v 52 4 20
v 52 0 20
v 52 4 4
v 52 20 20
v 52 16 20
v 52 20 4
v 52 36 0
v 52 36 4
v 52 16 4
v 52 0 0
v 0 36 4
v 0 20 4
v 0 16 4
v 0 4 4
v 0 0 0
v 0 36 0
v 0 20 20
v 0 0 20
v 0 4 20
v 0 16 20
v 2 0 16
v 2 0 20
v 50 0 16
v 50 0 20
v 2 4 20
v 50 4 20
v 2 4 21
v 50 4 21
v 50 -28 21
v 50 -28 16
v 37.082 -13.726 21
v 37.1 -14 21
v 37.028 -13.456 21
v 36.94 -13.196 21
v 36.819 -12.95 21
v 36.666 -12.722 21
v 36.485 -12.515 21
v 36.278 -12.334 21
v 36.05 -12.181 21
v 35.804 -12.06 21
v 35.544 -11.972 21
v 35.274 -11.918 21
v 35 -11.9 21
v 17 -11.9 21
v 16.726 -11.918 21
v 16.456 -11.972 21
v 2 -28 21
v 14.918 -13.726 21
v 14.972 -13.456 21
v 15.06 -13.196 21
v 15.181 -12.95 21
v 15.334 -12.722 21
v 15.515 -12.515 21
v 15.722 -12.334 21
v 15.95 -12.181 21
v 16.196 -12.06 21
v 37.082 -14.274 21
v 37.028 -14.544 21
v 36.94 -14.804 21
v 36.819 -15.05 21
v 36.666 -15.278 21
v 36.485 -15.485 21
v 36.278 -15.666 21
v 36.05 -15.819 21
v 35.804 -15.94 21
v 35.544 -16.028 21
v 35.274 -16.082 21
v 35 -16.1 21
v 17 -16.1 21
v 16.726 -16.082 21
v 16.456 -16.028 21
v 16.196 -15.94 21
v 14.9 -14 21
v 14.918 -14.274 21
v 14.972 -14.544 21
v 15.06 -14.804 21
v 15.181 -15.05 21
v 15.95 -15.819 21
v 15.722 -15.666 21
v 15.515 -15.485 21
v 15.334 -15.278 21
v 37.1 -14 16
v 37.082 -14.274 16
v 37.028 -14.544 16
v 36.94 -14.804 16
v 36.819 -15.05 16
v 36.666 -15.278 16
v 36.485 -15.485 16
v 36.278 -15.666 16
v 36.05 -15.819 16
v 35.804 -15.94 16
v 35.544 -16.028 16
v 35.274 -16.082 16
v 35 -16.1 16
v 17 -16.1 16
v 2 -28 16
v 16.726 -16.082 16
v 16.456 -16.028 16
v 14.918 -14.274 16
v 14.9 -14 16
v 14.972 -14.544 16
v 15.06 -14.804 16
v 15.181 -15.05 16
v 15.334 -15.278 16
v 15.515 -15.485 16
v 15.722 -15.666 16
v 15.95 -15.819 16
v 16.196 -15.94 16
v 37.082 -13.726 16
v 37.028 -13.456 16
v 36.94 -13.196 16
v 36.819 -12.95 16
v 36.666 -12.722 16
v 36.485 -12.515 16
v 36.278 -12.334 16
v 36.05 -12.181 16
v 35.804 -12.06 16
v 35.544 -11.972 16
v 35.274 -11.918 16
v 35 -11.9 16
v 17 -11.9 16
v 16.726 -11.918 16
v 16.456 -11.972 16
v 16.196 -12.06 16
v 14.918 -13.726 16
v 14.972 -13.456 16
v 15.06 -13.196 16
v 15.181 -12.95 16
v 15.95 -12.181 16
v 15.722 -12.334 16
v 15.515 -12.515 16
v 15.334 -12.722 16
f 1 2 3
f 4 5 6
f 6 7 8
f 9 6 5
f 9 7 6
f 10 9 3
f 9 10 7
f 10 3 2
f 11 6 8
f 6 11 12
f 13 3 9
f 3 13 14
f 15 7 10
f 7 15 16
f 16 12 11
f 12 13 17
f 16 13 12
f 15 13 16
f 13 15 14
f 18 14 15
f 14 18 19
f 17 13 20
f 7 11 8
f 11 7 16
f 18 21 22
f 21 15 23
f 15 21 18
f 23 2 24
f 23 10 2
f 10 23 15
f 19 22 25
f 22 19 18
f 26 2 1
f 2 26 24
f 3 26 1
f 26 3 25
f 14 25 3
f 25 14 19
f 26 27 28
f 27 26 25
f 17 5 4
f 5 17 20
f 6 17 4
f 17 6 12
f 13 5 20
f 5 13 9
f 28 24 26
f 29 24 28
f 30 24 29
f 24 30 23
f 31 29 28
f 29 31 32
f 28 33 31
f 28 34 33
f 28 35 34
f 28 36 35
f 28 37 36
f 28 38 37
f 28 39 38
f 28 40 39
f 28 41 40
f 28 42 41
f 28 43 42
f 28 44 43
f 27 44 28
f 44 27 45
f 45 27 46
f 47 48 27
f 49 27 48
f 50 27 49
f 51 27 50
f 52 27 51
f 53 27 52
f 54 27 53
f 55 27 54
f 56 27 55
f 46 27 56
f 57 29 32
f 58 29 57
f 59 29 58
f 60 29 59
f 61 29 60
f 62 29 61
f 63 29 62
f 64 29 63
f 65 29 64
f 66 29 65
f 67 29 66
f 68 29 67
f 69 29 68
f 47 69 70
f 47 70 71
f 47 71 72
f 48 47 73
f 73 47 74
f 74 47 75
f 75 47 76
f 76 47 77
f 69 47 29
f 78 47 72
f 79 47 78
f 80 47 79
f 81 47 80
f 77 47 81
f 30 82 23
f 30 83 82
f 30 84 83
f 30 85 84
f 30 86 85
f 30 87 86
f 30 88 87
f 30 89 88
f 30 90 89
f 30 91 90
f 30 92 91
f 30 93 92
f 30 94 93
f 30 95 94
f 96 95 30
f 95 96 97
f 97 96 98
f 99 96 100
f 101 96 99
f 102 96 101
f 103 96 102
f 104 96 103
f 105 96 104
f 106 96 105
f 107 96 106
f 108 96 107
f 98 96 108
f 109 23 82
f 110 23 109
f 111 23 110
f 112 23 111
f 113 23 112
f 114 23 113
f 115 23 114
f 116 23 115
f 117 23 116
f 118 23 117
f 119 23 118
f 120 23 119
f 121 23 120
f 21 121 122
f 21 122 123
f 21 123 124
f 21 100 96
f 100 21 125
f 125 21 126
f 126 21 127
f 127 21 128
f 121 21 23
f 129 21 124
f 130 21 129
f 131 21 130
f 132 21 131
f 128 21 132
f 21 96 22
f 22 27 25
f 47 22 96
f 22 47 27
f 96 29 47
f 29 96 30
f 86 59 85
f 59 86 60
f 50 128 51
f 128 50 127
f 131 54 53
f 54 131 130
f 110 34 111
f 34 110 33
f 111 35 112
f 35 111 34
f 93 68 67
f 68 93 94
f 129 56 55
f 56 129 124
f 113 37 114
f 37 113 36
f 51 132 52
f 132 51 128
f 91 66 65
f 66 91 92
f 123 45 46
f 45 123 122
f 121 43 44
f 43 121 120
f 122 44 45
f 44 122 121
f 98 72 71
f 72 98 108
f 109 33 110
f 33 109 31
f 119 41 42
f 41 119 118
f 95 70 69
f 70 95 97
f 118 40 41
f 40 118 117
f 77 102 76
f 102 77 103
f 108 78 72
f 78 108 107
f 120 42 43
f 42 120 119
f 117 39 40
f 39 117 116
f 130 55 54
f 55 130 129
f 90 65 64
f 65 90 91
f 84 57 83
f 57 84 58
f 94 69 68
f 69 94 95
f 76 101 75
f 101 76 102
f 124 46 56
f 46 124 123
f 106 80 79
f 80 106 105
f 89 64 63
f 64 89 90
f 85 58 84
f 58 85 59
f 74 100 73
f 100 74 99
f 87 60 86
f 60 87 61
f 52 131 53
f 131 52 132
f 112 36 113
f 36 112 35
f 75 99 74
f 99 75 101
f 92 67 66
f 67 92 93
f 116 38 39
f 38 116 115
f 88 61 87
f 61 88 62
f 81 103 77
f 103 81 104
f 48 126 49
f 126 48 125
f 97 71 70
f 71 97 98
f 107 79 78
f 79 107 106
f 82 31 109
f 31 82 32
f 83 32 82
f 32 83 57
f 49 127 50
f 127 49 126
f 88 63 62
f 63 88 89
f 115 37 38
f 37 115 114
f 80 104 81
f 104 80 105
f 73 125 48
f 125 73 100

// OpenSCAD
// Original parametric design draft. Dimensions are placeholders until the selected display and camera are measured.
// Not a fabricated, safety-tested, or clinical device.
display_thickness = 12;
lip = 16;
wall = 4;
bracket_width = 52;
camera_shelf_width = 48;
camera_shelf_depth = 28;
camera_shelf_thickness = 5;
adjustment_slot_length = 18;
$fn = 48;

module slot(length, radius=2.1) {
  hull() {
    translate([-length/2,0,0]) cylinder(h=12,r=radius,center=true);
    translate([ length/2,0,0]) cylinder(h=12,r=radius,center=true);
  }
}

difference() {
  union() {
    // Clip around the display top edge.
    cube([bracket_width, display_thickness+2*wall+lip, wall]);
    cube([bracket_width,wall,lip+wall]);
    translate([0,display_thickness+wall,0]) cube([bracket_width,wall,lip+wall]);
    // Camera is centred above display, independent of the child's head.
    translate([(bracket_width-camera_shelf_width)/2,-camera_shelf_depth,lip])
      cube([camera_shelf_width,camera_shelf_depth+wall,camera_shelf_thickness]);
  }
  translate([bracket_width/2,-camera_shelf_depth/2,lip+camera_shelf_thickness/2])
    slot(adjustment_slot_length);
}
